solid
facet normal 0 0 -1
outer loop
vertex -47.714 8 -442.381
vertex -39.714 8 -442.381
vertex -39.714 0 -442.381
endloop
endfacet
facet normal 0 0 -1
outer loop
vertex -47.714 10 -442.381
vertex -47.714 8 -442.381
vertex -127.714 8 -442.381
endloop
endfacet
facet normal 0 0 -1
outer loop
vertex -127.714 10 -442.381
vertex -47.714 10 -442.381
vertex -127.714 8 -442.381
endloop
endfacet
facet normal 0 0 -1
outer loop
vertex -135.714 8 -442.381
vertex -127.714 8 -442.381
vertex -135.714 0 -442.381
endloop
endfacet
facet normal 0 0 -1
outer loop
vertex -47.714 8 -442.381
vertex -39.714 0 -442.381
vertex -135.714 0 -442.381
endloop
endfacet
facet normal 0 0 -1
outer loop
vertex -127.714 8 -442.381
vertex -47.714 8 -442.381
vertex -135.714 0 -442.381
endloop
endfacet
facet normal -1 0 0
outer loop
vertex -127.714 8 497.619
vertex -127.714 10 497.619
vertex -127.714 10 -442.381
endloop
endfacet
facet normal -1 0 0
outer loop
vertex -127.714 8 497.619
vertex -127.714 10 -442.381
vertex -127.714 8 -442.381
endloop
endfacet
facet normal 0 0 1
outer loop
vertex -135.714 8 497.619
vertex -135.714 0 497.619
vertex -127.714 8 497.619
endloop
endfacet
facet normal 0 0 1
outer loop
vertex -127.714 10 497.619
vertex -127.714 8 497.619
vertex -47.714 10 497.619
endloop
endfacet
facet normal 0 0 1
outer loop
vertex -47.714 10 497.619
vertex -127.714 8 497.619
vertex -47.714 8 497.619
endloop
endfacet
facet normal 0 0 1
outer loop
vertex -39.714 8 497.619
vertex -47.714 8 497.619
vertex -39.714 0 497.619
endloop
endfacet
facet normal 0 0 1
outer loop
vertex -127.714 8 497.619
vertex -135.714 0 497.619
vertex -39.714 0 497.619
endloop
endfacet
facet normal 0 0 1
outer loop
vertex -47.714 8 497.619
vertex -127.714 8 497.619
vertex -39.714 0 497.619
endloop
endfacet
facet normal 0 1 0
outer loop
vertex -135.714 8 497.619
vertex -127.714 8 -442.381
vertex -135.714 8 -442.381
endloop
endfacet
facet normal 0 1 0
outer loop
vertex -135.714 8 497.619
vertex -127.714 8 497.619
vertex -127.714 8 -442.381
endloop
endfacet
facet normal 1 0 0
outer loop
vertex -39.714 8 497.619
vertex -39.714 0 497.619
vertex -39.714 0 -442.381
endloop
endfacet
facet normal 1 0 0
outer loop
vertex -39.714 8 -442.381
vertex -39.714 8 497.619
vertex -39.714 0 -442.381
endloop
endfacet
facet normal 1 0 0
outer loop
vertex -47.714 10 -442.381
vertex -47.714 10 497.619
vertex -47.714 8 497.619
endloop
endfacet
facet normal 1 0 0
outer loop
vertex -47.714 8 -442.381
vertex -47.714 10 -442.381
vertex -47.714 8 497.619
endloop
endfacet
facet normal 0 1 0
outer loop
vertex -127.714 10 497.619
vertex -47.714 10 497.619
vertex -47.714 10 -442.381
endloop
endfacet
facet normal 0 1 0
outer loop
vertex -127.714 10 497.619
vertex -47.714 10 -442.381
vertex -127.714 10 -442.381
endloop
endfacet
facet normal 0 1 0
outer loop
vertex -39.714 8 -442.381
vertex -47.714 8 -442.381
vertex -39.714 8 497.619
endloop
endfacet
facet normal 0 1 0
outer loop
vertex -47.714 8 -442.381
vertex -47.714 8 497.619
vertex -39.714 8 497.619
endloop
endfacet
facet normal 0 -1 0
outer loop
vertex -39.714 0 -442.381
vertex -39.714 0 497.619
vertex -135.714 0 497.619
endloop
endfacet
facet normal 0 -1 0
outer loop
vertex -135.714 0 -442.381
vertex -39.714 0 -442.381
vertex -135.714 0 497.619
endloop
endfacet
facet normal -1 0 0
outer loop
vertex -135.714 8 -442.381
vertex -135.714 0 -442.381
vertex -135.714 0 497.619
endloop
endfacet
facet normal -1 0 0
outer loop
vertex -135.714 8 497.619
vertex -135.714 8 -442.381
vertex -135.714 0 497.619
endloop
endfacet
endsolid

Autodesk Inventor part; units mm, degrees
ref_plane "YZ Plane" through (0, 0, 0) normal (1, 0, 0) x (0, 1, 0)
ref_plane "XZ Plane" through (0, 0, 0) normal (0, 1, 0) x (-1, 0, 0)
ref_plane "XY Plane" through (0, 0, 0) normal (0, 0, 1) x (1, 0, 0)
sketch "Sketch1" plane through (0, 0, 0) normal (0, 1, 0) x (-1, 0, 0)
  line L0 (135.7143, 497.619) -> (39.7143, 497.619)
  line L1 (39.7143, 497.619) -> (39.7143, -442.381)
  line L2 (39.7143, -442.381) -> (135.7143, -442.381)
  line L3 (135.7143, -442.381) -> (135.7143, 497.619)
  point P0 (0, 0)
  dimension "d0" = 940
  dimension "d1" = 96
extrude "Extrusion1" add sketch "Sketch1" along normal blind 14
sketch "Sketch2" plane through (-135.7143, 0, 497.619) normal (0, 0, 1) x (1, 0, 0)
  point P0 (135.7143, 0)
sketch "Sketch3" plane through (-135.7143, 0, 497.619) normal (0, 0, 1) x (1, 0, 0)
  line L0 (96, 14) -> (0, 14) projected
  line L1 (0, 14) -> (8, 14)
  line L2 (8, 14) -> (8, 8)
  line L3 (8, 8) -> (0, 8)
  line L4 (0, 8) -> (0, 14)
  line L5 (96, 14) -> (88, 14)
  line L6 (88, 14) -> (88, 8)
  line L7 (88, 8) -> (96, 8)
  line L8 (96, 8) -> (96, 14)
  line L9 (8, 14) -> (88, 14)
  line L10 (88, 14) -> (88, 10)
  line L11 (88, 10) -> (8, 10)
  line L12 (8, 10) -> (8, 14)
  point P0 (135.7143, 0)
  point P1 (8, 10)
  dimension "d4" = 8
  dimension "d5" = 6
  dimension "d6" = 6
extrude "Extrusion2" cut sketch "Sketch3" against normal through all
properties part number "TopZakrivka" material "Aluminum 6061"
